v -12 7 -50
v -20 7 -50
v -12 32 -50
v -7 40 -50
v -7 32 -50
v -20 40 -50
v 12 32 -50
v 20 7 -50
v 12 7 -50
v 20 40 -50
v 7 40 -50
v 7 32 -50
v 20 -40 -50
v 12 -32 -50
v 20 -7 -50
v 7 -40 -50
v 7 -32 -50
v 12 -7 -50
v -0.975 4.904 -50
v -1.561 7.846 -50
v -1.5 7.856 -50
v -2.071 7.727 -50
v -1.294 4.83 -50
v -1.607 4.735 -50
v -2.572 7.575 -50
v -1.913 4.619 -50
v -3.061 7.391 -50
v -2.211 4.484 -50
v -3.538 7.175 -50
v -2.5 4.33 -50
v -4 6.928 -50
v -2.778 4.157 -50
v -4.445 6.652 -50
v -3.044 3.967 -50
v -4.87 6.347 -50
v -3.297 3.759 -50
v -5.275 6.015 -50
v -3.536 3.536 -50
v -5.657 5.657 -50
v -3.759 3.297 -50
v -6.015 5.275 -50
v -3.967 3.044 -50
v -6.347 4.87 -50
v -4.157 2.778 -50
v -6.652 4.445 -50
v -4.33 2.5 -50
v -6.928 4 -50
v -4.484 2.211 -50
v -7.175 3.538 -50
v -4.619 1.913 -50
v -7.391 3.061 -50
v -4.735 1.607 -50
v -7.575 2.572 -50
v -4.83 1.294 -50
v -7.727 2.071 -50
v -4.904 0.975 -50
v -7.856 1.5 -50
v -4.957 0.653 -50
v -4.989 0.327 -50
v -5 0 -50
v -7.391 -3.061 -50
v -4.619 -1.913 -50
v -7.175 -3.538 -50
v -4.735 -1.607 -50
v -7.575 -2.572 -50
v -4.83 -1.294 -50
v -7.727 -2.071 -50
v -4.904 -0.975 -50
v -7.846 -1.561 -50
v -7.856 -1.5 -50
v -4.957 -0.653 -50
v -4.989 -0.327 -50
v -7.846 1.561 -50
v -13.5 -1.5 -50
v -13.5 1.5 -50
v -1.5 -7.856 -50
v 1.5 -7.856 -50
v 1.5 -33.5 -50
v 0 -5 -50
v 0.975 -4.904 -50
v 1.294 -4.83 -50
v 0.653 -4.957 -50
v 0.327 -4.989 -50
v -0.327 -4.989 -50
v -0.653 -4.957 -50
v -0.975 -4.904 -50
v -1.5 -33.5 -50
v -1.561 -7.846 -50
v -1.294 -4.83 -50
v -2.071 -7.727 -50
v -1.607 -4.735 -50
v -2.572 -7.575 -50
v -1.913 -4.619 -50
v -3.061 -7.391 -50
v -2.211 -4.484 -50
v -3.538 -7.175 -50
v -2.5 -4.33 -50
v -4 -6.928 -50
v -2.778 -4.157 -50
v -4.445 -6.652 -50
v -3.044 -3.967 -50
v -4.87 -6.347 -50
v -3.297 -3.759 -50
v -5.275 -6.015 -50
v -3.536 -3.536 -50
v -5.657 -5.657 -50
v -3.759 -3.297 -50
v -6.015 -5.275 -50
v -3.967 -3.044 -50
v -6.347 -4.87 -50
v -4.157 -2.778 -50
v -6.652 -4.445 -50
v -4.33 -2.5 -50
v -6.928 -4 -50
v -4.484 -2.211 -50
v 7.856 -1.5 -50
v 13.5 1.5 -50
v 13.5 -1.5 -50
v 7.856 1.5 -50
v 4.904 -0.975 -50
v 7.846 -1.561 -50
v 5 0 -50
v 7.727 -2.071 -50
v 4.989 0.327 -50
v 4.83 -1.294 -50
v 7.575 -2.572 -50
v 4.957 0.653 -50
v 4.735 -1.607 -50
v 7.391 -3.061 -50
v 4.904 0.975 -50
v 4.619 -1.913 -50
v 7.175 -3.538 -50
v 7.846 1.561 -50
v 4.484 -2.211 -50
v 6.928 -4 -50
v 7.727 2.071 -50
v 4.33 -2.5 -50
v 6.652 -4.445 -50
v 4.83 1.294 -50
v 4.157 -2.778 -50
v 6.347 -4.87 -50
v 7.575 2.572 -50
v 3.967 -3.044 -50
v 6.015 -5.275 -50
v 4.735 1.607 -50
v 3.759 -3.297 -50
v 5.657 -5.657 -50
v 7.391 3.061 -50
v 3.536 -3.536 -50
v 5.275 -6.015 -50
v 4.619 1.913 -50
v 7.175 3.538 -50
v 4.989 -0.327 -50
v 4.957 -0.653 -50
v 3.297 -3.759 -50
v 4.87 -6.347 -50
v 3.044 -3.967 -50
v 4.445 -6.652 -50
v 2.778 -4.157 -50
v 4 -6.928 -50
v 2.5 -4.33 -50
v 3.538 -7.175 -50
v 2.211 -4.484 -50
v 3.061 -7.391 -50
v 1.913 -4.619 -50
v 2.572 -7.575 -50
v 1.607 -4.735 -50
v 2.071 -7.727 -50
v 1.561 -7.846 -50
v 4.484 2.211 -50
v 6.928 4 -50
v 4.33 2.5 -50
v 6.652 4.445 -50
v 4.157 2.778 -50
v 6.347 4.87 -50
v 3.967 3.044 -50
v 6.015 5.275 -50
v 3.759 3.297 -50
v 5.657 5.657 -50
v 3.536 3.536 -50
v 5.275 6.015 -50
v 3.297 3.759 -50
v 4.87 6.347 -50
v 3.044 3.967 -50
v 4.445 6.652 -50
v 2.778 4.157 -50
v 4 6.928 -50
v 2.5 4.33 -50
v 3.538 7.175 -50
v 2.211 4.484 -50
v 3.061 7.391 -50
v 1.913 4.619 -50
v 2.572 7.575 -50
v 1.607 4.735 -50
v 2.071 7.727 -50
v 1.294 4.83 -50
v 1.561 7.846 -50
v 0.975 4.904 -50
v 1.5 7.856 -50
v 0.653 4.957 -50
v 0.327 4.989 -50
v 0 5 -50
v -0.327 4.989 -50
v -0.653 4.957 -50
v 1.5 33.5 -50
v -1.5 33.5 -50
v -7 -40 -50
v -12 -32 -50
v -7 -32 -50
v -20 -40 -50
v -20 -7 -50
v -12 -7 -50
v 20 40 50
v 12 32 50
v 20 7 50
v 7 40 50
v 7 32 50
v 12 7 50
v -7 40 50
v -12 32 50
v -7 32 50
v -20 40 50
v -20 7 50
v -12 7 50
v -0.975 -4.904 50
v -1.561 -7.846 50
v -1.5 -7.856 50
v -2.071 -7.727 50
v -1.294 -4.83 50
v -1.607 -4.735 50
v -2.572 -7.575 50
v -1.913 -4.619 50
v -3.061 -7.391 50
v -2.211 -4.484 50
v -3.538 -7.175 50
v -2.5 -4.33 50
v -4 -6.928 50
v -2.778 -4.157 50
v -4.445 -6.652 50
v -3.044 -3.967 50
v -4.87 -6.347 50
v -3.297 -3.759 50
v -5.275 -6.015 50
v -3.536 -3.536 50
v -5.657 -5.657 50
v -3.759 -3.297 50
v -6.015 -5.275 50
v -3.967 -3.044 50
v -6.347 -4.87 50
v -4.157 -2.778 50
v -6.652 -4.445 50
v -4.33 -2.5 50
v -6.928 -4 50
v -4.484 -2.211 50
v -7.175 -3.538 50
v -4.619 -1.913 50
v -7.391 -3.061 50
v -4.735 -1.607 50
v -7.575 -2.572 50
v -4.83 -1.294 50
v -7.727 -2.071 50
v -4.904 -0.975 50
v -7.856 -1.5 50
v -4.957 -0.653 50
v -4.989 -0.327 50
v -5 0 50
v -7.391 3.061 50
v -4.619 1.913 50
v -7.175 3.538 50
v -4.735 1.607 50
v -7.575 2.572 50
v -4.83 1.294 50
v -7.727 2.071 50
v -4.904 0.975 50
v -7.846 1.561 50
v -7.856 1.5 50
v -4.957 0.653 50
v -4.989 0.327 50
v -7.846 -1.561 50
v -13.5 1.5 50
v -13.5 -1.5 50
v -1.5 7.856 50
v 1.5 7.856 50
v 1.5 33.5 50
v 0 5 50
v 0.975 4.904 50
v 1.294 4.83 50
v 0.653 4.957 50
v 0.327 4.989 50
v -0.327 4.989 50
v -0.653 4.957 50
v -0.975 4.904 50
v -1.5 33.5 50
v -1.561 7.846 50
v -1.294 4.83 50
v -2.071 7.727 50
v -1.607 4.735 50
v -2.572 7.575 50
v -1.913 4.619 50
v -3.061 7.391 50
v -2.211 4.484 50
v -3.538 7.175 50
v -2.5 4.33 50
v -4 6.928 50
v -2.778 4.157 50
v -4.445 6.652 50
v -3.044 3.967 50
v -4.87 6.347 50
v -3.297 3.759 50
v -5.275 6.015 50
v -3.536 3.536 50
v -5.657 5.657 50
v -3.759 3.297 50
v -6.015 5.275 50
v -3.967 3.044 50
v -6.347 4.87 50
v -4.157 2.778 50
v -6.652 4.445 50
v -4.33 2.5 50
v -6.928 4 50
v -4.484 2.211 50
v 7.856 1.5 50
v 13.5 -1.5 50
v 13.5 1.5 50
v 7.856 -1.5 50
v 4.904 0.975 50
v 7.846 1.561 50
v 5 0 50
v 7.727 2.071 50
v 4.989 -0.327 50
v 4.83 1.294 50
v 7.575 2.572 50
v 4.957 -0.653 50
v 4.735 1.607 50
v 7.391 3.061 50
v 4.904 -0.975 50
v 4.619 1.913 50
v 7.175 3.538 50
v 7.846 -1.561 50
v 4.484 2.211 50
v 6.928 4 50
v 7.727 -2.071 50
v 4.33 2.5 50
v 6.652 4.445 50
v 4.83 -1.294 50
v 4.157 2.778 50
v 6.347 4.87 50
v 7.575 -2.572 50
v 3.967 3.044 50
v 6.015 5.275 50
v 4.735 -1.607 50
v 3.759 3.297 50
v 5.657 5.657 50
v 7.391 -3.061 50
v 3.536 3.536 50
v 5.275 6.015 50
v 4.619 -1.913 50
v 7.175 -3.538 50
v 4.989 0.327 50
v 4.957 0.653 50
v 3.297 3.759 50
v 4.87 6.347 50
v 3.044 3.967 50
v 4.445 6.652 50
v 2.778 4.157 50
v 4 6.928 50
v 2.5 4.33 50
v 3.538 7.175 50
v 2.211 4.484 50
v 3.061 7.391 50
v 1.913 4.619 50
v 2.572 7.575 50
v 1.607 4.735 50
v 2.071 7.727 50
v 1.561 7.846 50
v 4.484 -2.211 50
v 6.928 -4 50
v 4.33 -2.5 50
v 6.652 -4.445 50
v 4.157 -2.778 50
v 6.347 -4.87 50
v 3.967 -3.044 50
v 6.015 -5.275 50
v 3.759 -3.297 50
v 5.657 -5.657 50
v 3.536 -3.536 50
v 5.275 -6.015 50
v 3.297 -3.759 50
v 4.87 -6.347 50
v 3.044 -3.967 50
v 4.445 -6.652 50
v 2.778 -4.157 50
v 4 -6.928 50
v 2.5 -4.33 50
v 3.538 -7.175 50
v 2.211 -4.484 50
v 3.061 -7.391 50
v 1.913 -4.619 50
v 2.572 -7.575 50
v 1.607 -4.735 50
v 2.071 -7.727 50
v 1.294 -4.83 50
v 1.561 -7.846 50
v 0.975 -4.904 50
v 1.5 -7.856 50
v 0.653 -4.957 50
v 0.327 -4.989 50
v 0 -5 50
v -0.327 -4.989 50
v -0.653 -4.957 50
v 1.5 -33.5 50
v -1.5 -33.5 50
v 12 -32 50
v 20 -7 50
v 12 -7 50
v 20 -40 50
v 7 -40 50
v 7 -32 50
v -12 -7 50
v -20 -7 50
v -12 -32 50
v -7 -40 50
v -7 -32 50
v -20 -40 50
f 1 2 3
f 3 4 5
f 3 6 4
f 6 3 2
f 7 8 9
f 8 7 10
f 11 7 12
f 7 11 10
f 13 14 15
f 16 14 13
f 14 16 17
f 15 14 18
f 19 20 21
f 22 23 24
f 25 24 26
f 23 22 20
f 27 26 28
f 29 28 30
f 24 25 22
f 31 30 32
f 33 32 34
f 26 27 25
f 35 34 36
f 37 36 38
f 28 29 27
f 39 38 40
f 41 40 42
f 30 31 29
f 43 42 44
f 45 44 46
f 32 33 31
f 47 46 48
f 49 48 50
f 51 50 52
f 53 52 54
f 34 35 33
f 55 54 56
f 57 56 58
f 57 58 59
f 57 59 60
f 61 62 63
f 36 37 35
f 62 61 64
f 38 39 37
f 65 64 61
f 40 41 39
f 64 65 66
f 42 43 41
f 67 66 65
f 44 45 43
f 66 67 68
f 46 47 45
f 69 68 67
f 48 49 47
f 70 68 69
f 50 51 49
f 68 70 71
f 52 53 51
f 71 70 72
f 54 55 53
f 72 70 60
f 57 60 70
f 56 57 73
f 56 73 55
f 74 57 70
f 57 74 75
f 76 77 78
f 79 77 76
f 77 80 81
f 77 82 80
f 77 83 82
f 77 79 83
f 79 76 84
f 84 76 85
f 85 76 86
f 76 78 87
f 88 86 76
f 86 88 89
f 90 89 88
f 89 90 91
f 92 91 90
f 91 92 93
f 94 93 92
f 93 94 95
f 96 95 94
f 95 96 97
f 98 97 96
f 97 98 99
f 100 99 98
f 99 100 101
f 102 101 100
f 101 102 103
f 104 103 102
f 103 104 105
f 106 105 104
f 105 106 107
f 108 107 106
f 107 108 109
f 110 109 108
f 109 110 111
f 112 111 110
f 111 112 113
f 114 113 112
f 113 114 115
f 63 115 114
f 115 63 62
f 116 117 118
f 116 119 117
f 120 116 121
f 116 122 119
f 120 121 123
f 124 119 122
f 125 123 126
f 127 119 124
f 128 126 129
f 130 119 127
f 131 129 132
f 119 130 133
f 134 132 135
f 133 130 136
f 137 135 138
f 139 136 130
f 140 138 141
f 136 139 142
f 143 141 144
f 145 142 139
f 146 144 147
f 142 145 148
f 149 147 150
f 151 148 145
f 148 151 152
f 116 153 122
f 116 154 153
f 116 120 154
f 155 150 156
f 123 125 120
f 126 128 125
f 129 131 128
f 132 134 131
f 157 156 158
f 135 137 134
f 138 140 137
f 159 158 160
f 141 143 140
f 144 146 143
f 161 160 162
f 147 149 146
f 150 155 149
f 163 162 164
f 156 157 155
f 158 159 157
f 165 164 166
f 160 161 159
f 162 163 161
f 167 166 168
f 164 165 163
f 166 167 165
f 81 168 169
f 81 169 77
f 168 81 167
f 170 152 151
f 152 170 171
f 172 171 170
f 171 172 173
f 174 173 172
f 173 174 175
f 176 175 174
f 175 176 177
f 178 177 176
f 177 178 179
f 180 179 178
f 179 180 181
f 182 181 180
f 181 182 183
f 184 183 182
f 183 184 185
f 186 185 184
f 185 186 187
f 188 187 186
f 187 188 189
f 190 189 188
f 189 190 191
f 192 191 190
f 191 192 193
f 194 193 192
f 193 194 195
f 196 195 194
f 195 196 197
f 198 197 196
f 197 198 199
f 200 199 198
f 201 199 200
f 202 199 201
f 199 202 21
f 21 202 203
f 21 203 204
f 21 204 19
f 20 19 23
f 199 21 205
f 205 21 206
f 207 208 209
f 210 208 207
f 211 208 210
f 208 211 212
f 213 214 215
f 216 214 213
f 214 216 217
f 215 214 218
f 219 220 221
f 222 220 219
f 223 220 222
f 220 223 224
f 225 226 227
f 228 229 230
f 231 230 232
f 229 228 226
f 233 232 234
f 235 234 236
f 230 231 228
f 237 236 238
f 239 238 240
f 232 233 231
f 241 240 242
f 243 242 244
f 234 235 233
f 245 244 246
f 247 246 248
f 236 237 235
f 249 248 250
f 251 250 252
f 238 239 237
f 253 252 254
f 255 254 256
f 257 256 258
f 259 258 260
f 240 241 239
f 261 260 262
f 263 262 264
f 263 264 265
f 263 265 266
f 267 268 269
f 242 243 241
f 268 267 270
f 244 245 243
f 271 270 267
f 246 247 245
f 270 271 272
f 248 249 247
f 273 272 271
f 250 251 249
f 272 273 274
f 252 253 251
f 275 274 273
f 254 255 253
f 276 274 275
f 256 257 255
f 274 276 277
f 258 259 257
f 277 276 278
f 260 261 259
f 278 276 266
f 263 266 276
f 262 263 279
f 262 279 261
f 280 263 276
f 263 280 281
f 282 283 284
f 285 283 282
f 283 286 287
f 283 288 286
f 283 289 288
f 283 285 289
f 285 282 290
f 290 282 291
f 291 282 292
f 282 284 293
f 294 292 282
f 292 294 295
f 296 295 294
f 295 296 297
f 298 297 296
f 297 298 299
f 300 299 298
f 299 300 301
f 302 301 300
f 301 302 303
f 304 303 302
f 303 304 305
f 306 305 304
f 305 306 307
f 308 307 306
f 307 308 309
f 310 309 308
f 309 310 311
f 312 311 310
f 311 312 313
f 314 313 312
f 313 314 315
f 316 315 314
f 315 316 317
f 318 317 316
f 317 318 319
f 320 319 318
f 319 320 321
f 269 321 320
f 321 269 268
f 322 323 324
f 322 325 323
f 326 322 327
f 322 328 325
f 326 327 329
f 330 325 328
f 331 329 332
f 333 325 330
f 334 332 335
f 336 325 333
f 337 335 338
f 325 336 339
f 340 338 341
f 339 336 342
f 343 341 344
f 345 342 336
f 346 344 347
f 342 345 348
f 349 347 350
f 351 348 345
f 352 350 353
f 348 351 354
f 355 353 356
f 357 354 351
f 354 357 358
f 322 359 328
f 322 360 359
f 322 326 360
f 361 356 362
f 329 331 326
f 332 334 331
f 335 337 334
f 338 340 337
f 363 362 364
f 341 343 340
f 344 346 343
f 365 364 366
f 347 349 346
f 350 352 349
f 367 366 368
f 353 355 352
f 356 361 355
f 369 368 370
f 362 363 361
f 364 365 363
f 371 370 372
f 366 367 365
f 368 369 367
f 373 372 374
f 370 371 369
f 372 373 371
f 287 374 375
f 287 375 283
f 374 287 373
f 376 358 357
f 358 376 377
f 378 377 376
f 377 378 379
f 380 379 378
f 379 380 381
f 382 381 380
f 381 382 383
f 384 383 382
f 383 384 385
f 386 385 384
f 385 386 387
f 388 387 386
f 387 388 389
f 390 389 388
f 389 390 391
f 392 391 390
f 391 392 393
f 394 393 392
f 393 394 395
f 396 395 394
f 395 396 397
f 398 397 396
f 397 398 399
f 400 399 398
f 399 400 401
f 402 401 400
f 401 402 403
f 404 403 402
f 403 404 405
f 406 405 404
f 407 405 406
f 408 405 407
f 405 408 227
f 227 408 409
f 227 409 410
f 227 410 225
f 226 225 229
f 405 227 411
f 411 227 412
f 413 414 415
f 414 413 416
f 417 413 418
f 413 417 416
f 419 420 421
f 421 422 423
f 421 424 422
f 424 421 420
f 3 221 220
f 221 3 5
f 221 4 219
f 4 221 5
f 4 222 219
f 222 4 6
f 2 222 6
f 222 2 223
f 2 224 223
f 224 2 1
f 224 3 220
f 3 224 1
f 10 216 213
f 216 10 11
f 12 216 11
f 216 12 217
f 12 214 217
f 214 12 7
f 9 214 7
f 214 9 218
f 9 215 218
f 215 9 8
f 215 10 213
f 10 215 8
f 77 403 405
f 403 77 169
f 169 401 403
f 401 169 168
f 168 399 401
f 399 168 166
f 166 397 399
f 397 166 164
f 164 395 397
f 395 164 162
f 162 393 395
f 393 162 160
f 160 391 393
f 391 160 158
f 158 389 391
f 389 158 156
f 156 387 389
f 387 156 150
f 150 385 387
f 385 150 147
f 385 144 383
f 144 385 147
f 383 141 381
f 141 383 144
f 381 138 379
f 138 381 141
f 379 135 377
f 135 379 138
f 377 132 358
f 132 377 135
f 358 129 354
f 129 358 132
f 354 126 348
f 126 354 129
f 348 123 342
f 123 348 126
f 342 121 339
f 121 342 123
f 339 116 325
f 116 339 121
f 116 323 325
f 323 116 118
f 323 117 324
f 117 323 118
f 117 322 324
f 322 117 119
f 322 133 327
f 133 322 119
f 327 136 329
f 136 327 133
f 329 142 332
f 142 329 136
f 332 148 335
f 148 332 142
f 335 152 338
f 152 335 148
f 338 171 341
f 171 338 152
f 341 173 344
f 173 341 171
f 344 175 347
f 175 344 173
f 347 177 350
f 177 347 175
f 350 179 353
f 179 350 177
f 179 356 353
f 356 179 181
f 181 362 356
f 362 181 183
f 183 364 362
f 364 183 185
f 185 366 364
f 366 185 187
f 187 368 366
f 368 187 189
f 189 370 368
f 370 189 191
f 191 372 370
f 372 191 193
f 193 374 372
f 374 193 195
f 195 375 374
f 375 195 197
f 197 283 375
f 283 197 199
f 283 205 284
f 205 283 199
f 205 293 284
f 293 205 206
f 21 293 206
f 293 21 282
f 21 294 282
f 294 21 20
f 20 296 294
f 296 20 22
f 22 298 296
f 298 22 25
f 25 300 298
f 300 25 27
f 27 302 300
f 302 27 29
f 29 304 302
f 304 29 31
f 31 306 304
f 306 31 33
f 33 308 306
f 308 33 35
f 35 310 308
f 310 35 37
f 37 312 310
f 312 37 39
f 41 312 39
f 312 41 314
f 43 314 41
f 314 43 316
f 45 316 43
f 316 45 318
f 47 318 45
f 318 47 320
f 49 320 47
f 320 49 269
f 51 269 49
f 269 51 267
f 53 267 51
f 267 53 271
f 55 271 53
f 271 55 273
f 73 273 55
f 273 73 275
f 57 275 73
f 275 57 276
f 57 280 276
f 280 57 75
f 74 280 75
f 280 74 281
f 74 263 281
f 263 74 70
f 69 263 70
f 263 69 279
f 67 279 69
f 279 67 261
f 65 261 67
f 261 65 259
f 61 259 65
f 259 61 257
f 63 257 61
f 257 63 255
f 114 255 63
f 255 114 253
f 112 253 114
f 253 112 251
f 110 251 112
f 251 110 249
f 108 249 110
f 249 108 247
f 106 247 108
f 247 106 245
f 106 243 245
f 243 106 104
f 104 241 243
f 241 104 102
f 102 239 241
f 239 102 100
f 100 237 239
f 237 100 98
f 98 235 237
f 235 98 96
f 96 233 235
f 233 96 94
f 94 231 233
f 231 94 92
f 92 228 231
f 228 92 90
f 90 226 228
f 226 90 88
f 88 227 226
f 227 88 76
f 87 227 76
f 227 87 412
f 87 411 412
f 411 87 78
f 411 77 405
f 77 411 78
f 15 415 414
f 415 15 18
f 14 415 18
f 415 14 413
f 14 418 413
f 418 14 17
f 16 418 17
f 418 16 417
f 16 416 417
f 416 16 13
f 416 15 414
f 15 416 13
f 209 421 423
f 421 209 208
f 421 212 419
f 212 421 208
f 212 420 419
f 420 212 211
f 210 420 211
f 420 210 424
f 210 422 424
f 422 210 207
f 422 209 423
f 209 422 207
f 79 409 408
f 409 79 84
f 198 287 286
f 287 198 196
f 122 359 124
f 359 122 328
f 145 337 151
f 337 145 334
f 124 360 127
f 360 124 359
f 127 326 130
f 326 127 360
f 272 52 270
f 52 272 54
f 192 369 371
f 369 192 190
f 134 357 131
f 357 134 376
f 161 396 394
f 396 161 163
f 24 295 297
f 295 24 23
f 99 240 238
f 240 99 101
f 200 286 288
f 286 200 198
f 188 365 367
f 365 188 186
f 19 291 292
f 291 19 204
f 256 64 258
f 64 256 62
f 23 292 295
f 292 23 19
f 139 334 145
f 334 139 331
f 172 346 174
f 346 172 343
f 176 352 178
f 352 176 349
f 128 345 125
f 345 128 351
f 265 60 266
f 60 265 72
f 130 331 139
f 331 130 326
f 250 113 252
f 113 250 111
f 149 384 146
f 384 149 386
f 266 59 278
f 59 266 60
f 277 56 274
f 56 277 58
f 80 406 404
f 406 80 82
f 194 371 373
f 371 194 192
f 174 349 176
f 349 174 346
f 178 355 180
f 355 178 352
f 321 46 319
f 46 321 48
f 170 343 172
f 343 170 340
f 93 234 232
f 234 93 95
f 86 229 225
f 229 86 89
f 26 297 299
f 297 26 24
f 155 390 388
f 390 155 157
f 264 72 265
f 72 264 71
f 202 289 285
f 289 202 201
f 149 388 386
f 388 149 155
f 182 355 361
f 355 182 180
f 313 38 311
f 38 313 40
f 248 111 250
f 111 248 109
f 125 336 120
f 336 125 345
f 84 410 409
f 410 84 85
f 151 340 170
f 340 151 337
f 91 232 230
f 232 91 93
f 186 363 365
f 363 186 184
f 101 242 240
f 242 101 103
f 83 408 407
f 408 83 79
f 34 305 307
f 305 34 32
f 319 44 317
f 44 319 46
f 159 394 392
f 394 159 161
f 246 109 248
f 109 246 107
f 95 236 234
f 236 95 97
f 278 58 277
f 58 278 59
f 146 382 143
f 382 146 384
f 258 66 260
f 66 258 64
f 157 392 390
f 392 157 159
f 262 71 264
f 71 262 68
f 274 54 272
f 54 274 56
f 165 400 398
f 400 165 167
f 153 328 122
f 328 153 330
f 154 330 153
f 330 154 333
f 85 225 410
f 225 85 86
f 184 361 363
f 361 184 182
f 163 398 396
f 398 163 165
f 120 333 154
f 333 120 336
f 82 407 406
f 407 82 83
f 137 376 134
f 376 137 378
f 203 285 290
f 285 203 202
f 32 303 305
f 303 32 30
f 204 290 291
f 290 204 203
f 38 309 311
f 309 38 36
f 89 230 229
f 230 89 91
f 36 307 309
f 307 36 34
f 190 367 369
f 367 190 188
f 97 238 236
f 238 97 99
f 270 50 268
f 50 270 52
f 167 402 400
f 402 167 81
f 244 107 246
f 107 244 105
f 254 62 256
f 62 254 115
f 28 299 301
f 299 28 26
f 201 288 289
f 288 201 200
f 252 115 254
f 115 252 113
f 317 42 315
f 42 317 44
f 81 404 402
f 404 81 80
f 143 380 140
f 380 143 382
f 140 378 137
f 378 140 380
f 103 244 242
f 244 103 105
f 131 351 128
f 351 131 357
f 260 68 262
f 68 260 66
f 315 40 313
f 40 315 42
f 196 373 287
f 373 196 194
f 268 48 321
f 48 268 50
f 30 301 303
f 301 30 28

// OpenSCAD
// 40x80 aluminium T-slot extrusion (approximate), 100mm long
// Connectivity-fixed: ensure ALL parts overlap and form ONE connected solid.

$fn = 96;

// Parameters
W = 40.0;   // X (mm)
H = 80.0;   // Y (mm)
L = 100.0;  // Z (mm)

// Geometry (approx. 40-series)
outer_wall_t = 3.0;     // outer wall thickness
slot_open_w  = 8.0;     // slot mouth opening width
slot_cav_w   = 14.0;    // slot cavity width behind lips
slot_depth   = 12.0;    // depth from outer face inward
lip_t        = 2.0;     // lip thickness at opening

center_bore_d = 10.0;   // center hole diameter
web_t         = 3.0;    // internal web thickness

// Keep enough material so the profile stays connected
inner_margin  = 8.0;    // distance from outer boundary to inner void boundary

// Structural overlap (1-2mm) to guarantee attachment
overlap = 1.5;

// Small epsilon for boolean robustness
eps = 0.05;

module tslot_cut_2d(face_len, face_pos, depth, open_w, cav_w, lip_t) {
    // Cut for one face, oriented along +Y (caller rotates for other faces).
    y_face = face_pos;

    y_open_center = y_face - lip_t/2;
    y_cav_center  = y_face - depth/2;

    union() {
        hull() {
            translate([0, y_open_center])
                square([open_w, lip_t + 2*eps], center=true);

            translate([0, y_cav_center])
                square([cav_w, depth + 2*eps], center=true);
        }

        // Ensure the mouth is open to the outside face
        translate([0, y_face - (lip_t/2)])
            square([open_w, lip_t + 4*eps], center=true);
    }
}

module profile_2d() {
    innerW = max(0.01, W - 2*inner_margin);
    innerH = max(0.01, H - 2*inner_margin);

    // Inner void half-extents
    innerRx = innerW/2;
    innerRy = innerH/2;

    // Hub (ring) dimensions
    hub_od = center_bore_d + 2*web_t;   // as before
    hub_or = hub_od/2;
    bore_r = center_bore_d/2;

    // Webs must physically reach into the outer body (past the inner void boundary)
    // so they connect to the outer perimeter segments.
    web_half_len_x = max(0.01, innerRx + overlap); // reaches beyond inner void edge
    web_half_len_y = max(0.01, innerRy + overlap);

    // Also ensure webs overlap the hub ring (not just touch)
    // by making sure they extend at least to hub outer radius + overlap.
    web_half_len_x2 = max(web_half_len_x, hub_or + overlap);
    web_half_len_y2 = max(web_half_len_y, hub_or + overlap);

    union() {
        // Outer body with inner void + slots removed (NO center bore removed here)
        // This prevents the hub ring from becoming a floating island.
        difference() {
            square([W, H], center=true);

            // Inner void (creates chambers but leaves outer ring)
            square([innerW, innerH], center=true);

            // Four T-slots
            union() {
                // +Y
                tslot_cut_2d(W, H/2, slot_depth, slot_open_w, slot_cav_w, lip_t);
                // -Y
                rotate(180) tslot_cut_2d(W, H/2, slot_depth, slot_open_w, slot_cav_w, lip_t);
                // +X
                rotate(-90) tslot_cut_2d(H, W/2, slot_depth, slot_open_w, slot_cav_w, lip_t);
                // -X
                rotate(90) tslot_cut_2d(H, W/2, slot_depth, slot_open_w, slot_cav_w, lip_t);
            }
        }

        // Internal webs (explicitly overlap both hub and outer body by ~overlap)
        square([2*web_half_len_x2, web_t], center=true); // horizontal web
        square([web_t, 2*web_half_len_y2], center=true); // vertical web

        // Central hub ring (kept), now guaranteed to overlap webs
        difference() {
            circle(d=hub_od);
            circle(d=center_bore_d);
        }
    }
}

// Final: subtract the center bore ONCE from the whole union so nothing becomes disconnected.
color("Silver")
difference() {
    linear_extrude(height=L, center=true, convexity=10)
        profile_2d();

    // Through bore
    translate([0,0,0])
        cylinder(d=center_bore_d, h=L + 2, center=true);
}
